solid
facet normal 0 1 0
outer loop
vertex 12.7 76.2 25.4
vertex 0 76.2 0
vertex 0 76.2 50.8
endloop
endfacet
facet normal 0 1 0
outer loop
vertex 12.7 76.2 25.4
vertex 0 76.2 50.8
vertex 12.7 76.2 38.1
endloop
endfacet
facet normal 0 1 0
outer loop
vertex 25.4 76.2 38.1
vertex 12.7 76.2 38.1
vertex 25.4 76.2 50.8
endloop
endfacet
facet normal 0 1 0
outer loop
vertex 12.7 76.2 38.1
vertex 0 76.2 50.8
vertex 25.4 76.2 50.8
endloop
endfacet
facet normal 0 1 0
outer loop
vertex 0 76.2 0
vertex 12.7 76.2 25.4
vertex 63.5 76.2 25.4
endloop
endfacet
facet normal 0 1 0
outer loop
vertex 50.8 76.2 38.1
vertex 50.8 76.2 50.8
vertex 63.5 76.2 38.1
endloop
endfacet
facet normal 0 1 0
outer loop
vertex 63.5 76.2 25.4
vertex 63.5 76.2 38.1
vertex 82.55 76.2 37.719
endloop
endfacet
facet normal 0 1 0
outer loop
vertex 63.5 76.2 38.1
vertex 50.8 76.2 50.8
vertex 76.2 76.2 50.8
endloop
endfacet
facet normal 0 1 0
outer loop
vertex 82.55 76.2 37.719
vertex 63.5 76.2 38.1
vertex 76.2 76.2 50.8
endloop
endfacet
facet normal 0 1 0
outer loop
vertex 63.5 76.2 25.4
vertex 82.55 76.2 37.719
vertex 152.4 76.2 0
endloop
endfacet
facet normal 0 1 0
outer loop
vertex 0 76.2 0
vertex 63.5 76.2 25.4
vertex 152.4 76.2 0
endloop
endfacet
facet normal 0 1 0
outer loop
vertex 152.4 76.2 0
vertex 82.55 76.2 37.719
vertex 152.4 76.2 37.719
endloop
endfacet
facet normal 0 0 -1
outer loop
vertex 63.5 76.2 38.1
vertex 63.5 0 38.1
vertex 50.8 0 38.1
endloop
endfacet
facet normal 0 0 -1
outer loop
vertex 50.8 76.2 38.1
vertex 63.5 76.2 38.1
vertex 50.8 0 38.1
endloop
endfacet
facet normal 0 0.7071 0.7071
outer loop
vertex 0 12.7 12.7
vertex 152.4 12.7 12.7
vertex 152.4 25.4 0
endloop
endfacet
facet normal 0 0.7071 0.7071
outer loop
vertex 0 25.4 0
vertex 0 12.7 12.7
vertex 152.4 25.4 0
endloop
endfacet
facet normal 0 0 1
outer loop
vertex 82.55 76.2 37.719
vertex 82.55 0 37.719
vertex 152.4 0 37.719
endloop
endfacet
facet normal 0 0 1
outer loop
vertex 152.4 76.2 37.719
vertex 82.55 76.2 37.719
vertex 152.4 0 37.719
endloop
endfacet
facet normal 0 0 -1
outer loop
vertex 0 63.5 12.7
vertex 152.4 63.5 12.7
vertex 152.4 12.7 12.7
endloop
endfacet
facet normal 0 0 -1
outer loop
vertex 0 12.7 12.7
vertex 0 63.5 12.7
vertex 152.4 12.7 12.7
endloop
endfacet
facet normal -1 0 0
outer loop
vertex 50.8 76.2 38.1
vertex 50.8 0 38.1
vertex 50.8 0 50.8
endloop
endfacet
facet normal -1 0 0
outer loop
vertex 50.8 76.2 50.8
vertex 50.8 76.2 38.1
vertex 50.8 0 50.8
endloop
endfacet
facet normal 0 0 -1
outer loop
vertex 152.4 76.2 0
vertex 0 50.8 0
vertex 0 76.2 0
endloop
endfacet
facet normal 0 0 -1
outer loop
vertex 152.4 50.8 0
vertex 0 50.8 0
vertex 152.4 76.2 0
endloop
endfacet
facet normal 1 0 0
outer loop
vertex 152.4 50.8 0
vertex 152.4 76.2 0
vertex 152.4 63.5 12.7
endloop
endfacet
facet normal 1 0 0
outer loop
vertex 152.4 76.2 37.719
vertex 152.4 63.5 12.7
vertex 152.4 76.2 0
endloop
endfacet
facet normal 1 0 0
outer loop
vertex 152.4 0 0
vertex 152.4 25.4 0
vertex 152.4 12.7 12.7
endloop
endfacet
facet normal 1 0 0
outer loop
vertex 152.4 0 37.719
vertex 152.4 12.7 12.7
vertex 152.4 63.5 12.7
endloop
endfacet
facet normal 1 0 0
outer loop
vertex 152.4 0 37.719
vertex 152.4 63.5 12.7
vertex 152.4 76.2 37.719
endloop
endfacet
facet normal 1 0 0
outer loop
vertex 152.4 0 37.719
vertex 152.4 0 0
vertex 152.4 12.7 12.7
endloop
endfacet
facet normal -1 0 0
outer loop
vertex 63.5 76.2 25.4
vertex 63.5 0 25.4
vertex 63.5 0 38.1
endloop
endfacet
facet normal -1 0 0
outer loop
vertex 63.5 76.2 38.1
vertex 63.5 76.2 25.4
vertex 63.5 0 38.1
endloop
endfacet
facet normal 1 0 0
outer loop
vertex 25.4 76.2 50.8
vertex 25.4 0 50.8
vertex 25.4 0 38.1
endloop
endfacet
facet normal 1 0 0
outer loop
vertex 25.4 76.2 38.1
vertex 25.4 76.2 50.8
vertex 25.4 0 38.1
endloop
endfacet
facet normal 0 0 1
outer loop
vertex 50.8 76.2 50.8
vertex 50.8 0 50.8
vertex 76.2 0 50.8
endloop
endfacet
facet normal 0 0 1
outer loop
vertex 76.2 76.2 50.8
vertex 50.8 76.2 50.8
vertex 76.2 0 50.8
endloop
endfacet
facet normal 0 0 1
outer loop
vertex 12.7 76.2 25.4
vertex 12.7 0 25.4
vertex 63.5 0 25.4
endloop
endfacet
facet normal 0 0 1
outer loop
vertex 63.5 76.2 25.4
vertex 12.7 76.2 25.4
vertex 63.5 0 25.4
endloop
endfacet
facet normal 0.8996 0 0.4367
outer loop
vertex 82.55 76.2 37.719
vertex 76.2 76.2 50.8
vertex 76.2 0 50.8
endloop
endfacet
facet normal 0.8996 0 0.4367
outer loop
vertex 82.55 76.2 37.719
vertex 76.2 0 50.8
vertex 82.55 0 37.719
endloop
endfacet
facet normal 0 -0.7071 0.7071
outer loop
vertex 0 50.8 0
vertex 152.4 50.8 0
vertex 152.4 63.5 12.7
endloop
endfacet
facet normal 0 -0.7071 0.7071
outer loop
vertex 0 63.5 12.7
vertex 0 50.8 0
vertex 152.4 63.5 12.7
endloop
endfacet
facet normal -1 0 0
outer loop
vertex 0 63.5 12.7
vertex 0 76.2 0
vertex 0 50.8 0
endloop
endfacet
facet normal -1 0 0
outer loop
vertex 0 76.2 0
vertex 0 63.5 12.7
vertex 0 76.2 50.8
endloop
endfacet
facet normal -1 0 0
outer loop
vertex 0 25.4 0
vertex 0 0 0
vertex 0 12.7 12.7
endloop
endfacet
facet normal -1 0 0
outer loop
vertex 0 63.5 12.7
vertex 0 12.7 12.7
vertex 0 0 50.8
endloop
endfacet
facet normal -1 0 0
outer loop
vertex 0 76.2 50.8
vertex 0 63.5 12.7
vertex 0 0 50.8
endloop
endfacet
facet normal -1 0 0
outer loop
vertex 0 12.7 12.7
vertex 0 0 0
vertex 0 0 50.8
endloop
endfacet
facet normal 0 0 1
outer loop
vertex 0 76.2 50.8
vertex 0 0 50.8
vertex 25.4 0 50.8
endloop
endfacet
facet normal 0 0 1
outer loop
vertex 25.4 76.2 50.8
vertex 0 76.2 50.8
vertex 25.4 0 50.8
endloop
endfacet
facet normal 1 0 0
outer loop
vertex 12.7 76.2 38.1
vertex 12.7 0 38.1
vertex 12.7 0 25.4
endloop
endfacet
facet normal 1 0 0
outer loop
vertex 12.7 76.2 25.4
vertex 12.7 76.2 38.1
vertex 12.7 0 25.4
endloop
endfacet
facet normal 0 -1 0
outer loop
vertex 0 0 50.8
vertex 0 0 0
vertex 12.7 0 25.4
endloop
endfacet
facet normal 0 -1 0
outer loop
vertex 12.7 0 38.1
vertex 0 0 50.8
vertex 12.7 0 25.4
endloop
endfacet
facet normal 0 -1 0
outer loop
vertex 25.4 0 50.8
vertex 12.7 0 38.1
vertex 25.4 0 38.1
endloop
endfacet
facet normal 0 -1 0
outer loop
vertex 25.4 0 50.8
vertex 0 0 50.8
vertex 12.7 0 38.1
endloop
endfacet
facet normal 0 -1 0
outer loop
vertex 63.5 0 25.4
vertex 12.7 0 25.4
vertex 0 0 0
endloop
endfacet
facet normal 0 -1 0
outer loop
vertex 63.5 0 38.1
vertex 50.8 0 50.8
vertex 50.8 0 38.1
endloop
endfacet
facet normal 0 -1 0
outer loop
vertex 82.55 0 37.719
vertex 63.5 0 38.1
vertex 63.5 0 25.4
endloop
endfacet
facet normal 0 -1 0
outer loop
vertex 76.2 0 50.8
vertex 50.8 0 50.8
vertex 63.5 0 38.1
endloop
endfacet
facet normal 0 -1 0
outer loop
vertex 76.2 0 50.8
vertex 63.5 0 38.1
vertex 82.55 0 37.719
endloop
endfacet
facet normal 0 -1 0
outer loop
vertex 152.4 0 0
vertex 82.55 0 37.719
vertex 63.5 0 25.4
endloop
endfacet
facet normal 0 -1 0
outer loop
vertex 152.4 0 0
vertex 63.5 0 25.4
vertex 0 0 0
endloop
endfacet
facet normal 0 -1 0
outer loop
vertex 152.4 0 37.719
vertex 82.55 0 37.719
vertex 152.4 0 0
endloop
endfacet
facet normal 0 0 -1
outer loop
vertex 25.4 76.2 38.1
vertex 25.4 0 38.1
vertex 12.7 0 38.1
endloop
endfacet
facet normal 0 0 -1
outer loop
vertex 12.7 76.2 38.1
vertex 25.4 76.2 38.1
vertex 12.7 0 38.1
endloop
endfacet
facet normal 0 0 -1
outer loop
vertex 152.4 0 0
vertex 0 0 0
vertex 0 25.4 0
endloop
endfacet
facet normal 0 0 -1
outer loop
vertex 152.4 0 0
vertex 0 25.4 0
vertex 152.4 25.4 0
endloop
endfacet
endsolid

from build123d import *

# Parameters (mm, degrees)
F0_W     = 152.4
F0_H     = 50.8
F1_DEPTH = 76.2
F3_DEPTH = 76.2
F5_DEPTH = 152.4


with BuildPart() as f1:
    # F0 (on Front) → F1 (new body)
    with BuildSketch(Plane.XZ):
        with Locations((76.2, 25.4)):
            Rectangle(F0_W, F0_H)
    extrude(amount=-F1_DEPTH)

    # F2 (on face) → F3 (cut)
    with BuildSketch(Plane.XZ):
        Polygon((50.8, 50.8), (25.4, 50.8), (25.4, 38.1), (12.700001, 38.1), (12.700001, 25.4), (63.500001, 25.4), (63.500001, 38.1), (50.8, 38.1), align=None)
        Polygon((82.55, 37.719), (152.4, 37.719), (152.4, 50.8), (76.2, 50.8), align=None)
    extrude(amount=-F3_DEPTH, mode=Mode.SUBTRACT)

    # F4 (on face) → F5 (cut)
    with BuildSketch(Plane.YZ.offset(152.4)):
        Polygon((12.7, 12.7), (25.4, 0), (50.8, 0), (63.5, 12.7), align=None)
    extrude(amount=-F5_DEPTH, mode=Mode.SUBTRACT)


solid = f1.part
